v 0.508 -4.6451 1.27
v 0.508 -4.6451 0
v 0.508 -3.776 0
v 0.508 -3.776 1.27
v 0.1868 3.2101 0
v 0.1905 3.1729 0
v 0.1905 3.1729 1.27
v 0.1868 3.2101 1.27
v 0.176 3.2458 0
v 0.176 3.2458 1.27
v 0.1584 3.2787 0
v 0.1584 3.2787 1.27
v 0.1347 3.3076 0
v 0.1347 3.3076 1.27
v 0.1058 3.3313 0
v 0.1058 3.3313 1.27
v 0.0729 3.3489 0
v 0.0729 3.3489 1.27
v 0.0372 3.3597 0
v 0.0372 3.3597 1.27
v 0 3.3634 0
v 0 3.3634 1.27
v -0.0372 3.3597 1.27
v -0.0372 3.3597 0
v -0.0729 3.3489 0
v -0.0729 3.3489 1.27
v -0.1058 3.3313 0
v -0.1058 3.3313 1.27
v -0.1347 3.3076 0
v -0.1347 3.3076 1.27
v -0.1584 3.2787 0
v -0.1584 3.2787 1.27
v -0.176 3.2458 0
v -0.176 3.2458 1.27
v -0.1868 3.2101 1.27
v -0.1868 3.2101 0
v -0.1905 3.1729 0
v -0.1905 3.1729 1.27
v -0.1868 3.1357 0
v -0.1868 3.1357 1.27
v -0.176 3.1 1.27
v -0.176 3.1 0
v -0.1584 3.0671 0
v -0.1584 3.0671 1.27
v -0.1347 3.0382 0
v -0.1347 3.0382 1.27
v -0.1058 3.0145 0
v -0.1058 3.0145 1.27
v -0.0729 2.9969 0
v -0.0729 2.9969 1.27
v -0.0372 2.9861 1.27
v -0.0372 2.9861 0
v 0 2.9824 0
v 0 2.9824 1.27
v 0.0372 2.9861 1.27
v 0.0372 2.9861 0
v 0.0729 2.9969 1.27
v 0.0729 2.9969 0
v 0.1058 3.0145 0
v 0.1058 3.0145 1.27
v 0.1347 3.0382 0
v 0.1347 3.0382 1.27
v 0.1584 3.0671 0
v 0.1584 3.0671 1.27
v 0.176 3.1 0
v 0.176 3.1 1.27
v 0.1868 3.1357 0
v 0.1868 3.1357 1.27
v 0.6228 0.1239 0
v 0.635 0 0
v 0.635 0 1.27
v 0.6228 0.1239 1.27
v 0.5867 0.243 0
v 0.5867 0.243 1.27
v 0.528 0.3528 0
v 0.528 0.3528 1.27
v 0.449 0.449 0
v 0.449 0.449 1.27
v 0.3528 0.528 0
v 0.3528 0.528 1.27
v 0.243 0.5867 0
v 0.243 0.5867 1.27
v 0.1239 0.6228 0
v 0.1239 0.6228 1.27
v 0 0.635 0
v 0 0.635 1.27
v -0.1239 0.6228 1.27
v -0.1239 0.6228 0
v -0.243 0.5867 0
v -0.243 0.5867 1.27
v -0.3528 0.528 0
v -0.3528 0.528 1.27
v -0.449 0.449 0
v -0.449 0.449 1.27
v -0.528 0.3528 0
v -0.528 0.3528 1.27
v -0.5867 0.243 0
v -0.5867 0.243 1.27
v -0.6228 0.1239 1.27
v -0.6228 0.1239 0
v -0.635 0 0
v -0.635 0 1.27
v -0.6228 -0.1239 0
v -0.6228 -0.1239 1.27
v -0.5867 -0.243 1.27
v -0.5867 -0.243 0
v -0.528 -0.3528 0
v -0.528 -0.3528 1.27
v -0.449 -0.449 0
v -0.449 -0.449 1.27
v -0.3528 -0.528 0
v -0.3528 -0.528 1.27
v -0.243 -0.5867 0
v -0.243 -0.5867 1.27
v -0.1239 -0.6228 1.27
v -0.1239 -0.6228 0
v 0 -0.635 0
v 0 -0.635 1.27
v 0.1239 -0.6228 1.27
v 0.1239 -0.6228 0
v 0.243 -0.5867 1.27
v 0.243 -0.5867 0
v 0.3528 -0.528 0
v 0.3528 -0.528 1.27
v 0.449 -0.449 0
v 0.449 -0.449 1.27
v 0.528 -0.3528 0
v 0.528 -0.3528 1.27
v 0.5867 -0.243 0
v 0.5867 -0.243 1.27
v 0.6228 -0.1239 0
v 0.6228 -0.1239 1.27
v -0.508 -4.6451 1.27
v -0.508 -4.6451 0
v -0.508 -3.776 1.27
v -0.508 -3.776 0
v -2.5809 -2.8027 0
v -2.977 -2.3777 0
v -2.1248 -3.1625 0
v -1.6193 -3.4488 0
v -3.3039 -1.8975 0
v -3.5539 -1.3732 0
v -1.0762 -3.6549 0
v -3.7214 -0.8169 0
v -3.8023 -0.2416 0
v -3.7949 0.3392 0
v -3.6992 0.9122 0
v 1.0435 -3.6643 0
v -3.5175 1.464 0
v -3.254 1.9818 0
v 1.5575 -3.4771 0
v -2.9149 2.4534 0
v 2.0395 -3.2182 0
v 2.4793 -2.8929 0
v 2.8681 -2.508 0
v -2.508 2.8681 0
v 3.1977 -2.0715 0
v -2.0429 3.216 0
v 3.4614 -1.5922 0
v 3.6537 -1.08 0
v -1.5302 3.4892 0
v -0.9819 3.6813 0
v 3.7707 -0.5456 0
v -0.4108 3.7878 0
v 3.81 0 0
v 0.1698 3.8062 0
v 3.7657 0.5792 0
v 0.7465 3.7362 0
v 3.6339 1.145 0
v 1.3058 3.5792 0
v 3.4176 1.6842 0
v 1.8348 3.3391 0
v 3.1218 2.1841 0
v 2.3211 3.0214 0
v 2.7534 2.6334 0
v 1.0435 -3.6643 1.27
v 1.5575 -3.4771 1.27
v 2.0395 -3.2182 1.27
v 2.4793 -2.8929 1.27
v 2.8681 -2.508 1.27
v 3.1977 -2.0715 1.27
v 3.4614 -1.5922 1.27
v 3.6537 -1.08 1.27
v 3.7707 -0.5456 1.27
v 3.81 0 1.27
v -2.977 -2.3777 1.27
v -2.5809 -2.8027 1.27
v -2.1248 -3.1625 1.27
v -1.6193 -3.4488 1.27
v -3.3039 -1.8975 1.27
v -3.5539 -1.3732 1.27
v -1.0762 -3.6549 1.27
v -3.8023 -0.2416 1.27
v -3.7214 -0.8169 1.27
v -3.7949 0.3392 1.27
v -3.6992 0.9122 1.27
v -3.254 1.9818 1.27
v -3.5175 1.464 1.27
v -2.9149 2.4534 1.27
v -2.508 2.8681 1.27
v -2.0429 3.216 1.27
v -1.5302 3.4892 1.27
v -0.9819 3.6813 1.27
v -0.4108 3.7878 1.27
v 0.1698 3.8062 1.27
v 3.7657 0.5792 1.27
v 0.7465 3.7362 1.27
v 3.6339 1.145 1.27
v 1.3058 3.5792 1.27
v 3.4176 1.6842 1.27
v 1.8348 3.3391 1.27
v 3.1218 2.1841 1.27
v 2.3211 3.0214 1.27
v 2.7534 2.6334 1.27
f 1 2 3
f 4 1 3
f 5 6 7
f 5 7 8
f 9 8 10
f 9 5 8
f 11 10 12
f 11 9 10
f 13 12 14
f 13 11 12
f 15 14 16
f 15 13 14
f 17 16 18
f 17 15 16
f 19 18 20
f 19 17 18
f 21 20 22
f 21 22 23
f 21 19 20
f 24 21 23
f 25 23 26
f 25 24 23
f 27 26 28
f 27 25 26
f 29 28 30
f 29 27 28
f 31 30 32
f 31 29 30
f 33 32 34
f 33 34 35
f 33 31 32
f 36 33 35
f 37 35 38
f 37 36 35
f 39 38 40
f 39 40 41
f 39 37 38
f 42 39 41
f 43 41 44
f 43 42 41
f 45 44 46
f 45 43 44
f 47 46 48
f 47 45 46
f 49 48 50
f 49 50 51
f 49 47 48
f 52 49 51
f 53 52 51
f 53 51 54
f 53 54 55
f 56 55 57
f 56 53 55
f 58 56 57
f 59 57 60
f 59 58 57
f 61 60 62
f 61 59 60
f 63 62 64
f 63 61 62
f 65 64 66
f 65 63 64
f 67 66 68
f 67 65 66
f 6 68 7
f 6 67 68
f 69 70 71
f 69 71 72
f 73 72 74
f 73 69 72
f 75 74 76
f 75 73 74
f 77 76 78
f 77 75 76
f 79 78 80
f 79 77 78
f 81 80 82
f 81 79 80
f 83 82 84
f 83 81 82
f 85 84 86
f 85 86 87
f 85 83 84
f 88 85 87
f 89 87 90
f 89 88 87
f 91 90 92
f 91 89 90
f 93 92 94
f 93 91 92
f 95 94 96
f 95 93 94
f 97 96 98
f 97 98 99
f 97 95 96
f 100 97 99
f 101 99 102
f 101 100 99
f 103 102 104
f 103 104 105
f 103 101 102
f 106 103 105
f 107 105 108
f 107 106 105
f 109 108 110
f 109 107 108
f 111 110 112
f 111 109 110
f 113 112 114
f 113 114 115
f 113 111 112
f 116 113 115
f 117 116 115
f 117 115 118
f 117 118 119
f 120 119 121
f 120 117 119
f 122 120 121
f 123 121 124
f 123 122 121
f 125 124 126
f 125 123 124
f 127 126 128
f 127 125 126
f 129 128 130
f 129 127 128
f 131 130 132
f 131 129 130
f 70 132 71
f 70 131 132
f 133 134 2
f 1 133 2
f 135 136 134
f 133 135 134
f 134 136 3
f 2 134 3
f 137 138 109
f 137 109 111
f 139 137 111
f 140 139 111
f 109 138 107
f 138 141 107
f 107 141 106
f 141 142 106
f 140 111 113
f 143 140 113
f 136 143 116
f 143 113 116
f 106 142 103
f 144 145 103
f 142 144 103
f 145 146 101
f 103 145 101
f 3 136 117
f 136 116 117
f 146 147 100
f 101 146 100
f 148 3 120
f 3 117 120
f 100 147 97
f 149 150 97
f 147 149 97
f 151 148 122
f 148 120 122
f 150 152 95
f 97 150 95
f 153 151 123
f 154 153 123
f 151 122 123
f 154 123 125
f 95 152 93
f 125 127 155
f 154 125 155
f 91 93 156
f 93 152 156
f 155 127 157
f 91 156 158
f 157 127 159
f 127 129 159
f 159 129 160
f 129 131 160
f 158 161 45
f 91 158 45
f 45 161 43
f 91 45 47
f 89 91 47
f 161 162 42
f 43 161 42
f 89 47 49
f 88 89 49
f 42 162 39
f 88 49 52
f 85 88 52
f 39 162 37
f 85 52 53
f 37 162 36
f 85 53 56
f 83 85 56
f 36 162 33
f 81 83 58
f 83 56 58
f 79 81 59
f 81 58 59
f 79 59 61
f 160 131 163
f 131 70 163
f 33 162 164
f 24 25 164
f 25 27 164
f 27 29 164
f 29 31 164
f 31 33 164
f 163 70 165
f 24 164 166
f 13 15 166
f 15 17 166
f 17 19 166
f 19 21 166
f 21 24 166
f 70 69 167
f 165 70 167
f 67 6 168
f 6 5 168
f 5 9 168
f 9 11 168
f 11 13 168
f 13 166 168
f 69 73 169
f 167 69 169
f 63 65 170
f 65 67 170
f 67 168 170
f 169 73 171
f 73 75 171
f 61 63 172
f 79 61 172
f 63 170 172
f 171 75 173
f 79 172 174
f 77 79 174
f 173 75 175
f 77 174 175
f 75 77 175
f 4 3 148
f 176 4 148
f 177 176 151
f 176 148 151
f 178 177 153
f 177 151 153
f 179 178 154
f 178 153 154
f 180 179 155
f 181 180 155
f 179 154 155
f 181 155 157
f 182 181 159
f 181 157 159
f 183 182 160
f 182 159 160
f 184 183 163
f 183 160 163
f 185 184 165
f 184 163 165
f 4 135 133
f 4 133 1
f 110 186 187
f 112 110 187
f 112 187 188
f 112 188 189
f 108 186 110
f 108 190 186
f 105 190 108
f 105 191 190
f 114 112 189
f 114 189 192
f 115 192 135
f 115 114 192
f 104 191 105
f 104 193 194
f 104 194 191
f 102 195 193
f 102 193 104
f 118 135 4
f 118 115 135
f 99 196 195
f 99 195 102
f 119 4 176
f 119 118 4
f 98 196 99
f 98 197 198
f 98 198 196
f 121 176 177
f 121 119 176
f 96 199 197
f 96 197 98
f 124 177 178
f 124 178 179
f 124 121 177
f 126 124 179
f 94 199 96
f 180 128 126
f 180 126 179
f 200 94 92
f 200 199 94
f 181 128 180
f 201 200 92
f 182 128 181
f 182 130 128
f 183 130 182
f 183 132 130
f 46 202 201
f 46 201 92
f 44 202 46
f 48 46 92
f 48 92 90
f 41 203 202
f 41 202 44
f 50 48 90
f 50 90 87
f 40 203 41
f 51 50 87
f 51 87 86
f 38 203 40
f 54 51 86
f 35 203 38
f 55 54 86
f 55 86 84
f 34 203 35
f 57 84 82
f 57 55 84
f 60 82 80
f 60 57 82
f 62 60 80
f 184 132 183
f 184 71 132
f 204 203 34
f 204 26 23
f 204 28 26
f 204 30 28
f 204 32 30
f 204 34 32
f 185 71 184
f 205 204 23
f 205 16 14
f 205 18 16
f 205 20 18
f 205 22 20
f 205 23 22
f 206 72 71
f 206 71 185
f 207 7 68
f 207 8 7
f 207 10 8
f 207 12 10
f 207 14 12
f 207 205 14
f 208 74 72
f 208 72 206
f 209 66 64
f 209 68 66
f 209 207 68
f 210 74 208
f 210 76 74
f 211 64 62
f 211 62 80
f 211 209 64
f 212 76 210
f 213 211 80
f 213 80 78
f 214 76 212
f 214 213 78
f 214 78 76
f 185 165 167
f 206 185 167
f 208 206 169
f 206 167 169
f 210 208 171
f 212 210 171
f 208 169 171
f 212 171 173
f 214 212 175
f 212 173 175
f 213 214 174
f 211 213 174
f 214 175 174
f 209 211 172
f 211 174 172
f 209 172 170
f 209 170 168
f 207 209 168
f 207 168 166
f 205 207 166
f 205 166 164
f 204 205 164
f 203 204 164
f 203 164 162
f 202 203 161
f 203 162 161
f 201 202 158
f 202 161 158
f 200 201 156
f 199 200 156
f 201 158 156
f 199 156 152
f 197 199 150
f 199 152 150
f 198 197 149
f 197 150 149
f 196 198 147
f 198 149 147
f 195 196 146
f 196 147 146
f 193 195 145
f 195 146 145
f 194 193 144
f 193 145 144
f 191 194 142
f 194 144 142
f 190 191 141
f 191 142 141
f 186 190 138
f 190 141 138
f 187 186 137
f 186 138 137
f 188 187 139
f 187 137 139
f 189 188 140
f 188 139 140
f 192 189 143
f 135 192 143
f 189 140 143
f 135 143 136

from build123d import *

# Parameters (mm, degrees)
F0_R     = 0.635
F0_R_2   = 0.1905
F1_DEPTH = 1.27


with BuildPart() as f1:
    # F0 (on Top) → F1 (new body)
    with BuildSketch(Plane.XY):
        with BuildLine():
            ThreePointArc((0.508, -3.7759814618), (2.8680638068, -2.5080490426), (3.81, 0))
            ThreePointArc((3.81, 0), (-2.5080490426, 2.8680638068), (-0.508, -3.7759814618))
            Line((-0.508, -3.7759814618), (-0.508, -2.1051138332))
            Line((-0.508, -2.1051138332), (0.508, -2.1051138332))
            Line((0.508, -2.1051138332), (0.508, -3.7759814618))
        make_face()
        Circle(F0_R, mode=Mode.SUBTRACT)
        with Locations((0, 3.1728937756)):
            Circle(F0_R_2, mode=Mode.SUBTRACT)
        with BuildLine():
            Line((-0.508, -2.1051138332), (-0.508, -3.7759814618))
            ThreePointArc((-0.508, -3.7759814618), (0, -3.81), (0.508, -3.7759814618))
            Line((0.508, -3.7759814618), (0.508, -2.1051138332))
            Line((0.508, -2.1051138332), (-0.508, -2.1051138332))
        make_face()
        with BuildLine():
            ThreePointArc((0.508, -3.7759814618), (0, -3.81), (-0.508, -3.7759814618))
            Line((-0.508, -3.7759814618), (-0.508, -4.6451138332))
            Line((-0.508, -4.6451138332), (0.508, -4.6451138332))
            Line((0.508, -4.6451138332), (0.508, -3.7759814618))
        make_face()
    extrude(amount=F1_DEPTH)


solid = f1.part
